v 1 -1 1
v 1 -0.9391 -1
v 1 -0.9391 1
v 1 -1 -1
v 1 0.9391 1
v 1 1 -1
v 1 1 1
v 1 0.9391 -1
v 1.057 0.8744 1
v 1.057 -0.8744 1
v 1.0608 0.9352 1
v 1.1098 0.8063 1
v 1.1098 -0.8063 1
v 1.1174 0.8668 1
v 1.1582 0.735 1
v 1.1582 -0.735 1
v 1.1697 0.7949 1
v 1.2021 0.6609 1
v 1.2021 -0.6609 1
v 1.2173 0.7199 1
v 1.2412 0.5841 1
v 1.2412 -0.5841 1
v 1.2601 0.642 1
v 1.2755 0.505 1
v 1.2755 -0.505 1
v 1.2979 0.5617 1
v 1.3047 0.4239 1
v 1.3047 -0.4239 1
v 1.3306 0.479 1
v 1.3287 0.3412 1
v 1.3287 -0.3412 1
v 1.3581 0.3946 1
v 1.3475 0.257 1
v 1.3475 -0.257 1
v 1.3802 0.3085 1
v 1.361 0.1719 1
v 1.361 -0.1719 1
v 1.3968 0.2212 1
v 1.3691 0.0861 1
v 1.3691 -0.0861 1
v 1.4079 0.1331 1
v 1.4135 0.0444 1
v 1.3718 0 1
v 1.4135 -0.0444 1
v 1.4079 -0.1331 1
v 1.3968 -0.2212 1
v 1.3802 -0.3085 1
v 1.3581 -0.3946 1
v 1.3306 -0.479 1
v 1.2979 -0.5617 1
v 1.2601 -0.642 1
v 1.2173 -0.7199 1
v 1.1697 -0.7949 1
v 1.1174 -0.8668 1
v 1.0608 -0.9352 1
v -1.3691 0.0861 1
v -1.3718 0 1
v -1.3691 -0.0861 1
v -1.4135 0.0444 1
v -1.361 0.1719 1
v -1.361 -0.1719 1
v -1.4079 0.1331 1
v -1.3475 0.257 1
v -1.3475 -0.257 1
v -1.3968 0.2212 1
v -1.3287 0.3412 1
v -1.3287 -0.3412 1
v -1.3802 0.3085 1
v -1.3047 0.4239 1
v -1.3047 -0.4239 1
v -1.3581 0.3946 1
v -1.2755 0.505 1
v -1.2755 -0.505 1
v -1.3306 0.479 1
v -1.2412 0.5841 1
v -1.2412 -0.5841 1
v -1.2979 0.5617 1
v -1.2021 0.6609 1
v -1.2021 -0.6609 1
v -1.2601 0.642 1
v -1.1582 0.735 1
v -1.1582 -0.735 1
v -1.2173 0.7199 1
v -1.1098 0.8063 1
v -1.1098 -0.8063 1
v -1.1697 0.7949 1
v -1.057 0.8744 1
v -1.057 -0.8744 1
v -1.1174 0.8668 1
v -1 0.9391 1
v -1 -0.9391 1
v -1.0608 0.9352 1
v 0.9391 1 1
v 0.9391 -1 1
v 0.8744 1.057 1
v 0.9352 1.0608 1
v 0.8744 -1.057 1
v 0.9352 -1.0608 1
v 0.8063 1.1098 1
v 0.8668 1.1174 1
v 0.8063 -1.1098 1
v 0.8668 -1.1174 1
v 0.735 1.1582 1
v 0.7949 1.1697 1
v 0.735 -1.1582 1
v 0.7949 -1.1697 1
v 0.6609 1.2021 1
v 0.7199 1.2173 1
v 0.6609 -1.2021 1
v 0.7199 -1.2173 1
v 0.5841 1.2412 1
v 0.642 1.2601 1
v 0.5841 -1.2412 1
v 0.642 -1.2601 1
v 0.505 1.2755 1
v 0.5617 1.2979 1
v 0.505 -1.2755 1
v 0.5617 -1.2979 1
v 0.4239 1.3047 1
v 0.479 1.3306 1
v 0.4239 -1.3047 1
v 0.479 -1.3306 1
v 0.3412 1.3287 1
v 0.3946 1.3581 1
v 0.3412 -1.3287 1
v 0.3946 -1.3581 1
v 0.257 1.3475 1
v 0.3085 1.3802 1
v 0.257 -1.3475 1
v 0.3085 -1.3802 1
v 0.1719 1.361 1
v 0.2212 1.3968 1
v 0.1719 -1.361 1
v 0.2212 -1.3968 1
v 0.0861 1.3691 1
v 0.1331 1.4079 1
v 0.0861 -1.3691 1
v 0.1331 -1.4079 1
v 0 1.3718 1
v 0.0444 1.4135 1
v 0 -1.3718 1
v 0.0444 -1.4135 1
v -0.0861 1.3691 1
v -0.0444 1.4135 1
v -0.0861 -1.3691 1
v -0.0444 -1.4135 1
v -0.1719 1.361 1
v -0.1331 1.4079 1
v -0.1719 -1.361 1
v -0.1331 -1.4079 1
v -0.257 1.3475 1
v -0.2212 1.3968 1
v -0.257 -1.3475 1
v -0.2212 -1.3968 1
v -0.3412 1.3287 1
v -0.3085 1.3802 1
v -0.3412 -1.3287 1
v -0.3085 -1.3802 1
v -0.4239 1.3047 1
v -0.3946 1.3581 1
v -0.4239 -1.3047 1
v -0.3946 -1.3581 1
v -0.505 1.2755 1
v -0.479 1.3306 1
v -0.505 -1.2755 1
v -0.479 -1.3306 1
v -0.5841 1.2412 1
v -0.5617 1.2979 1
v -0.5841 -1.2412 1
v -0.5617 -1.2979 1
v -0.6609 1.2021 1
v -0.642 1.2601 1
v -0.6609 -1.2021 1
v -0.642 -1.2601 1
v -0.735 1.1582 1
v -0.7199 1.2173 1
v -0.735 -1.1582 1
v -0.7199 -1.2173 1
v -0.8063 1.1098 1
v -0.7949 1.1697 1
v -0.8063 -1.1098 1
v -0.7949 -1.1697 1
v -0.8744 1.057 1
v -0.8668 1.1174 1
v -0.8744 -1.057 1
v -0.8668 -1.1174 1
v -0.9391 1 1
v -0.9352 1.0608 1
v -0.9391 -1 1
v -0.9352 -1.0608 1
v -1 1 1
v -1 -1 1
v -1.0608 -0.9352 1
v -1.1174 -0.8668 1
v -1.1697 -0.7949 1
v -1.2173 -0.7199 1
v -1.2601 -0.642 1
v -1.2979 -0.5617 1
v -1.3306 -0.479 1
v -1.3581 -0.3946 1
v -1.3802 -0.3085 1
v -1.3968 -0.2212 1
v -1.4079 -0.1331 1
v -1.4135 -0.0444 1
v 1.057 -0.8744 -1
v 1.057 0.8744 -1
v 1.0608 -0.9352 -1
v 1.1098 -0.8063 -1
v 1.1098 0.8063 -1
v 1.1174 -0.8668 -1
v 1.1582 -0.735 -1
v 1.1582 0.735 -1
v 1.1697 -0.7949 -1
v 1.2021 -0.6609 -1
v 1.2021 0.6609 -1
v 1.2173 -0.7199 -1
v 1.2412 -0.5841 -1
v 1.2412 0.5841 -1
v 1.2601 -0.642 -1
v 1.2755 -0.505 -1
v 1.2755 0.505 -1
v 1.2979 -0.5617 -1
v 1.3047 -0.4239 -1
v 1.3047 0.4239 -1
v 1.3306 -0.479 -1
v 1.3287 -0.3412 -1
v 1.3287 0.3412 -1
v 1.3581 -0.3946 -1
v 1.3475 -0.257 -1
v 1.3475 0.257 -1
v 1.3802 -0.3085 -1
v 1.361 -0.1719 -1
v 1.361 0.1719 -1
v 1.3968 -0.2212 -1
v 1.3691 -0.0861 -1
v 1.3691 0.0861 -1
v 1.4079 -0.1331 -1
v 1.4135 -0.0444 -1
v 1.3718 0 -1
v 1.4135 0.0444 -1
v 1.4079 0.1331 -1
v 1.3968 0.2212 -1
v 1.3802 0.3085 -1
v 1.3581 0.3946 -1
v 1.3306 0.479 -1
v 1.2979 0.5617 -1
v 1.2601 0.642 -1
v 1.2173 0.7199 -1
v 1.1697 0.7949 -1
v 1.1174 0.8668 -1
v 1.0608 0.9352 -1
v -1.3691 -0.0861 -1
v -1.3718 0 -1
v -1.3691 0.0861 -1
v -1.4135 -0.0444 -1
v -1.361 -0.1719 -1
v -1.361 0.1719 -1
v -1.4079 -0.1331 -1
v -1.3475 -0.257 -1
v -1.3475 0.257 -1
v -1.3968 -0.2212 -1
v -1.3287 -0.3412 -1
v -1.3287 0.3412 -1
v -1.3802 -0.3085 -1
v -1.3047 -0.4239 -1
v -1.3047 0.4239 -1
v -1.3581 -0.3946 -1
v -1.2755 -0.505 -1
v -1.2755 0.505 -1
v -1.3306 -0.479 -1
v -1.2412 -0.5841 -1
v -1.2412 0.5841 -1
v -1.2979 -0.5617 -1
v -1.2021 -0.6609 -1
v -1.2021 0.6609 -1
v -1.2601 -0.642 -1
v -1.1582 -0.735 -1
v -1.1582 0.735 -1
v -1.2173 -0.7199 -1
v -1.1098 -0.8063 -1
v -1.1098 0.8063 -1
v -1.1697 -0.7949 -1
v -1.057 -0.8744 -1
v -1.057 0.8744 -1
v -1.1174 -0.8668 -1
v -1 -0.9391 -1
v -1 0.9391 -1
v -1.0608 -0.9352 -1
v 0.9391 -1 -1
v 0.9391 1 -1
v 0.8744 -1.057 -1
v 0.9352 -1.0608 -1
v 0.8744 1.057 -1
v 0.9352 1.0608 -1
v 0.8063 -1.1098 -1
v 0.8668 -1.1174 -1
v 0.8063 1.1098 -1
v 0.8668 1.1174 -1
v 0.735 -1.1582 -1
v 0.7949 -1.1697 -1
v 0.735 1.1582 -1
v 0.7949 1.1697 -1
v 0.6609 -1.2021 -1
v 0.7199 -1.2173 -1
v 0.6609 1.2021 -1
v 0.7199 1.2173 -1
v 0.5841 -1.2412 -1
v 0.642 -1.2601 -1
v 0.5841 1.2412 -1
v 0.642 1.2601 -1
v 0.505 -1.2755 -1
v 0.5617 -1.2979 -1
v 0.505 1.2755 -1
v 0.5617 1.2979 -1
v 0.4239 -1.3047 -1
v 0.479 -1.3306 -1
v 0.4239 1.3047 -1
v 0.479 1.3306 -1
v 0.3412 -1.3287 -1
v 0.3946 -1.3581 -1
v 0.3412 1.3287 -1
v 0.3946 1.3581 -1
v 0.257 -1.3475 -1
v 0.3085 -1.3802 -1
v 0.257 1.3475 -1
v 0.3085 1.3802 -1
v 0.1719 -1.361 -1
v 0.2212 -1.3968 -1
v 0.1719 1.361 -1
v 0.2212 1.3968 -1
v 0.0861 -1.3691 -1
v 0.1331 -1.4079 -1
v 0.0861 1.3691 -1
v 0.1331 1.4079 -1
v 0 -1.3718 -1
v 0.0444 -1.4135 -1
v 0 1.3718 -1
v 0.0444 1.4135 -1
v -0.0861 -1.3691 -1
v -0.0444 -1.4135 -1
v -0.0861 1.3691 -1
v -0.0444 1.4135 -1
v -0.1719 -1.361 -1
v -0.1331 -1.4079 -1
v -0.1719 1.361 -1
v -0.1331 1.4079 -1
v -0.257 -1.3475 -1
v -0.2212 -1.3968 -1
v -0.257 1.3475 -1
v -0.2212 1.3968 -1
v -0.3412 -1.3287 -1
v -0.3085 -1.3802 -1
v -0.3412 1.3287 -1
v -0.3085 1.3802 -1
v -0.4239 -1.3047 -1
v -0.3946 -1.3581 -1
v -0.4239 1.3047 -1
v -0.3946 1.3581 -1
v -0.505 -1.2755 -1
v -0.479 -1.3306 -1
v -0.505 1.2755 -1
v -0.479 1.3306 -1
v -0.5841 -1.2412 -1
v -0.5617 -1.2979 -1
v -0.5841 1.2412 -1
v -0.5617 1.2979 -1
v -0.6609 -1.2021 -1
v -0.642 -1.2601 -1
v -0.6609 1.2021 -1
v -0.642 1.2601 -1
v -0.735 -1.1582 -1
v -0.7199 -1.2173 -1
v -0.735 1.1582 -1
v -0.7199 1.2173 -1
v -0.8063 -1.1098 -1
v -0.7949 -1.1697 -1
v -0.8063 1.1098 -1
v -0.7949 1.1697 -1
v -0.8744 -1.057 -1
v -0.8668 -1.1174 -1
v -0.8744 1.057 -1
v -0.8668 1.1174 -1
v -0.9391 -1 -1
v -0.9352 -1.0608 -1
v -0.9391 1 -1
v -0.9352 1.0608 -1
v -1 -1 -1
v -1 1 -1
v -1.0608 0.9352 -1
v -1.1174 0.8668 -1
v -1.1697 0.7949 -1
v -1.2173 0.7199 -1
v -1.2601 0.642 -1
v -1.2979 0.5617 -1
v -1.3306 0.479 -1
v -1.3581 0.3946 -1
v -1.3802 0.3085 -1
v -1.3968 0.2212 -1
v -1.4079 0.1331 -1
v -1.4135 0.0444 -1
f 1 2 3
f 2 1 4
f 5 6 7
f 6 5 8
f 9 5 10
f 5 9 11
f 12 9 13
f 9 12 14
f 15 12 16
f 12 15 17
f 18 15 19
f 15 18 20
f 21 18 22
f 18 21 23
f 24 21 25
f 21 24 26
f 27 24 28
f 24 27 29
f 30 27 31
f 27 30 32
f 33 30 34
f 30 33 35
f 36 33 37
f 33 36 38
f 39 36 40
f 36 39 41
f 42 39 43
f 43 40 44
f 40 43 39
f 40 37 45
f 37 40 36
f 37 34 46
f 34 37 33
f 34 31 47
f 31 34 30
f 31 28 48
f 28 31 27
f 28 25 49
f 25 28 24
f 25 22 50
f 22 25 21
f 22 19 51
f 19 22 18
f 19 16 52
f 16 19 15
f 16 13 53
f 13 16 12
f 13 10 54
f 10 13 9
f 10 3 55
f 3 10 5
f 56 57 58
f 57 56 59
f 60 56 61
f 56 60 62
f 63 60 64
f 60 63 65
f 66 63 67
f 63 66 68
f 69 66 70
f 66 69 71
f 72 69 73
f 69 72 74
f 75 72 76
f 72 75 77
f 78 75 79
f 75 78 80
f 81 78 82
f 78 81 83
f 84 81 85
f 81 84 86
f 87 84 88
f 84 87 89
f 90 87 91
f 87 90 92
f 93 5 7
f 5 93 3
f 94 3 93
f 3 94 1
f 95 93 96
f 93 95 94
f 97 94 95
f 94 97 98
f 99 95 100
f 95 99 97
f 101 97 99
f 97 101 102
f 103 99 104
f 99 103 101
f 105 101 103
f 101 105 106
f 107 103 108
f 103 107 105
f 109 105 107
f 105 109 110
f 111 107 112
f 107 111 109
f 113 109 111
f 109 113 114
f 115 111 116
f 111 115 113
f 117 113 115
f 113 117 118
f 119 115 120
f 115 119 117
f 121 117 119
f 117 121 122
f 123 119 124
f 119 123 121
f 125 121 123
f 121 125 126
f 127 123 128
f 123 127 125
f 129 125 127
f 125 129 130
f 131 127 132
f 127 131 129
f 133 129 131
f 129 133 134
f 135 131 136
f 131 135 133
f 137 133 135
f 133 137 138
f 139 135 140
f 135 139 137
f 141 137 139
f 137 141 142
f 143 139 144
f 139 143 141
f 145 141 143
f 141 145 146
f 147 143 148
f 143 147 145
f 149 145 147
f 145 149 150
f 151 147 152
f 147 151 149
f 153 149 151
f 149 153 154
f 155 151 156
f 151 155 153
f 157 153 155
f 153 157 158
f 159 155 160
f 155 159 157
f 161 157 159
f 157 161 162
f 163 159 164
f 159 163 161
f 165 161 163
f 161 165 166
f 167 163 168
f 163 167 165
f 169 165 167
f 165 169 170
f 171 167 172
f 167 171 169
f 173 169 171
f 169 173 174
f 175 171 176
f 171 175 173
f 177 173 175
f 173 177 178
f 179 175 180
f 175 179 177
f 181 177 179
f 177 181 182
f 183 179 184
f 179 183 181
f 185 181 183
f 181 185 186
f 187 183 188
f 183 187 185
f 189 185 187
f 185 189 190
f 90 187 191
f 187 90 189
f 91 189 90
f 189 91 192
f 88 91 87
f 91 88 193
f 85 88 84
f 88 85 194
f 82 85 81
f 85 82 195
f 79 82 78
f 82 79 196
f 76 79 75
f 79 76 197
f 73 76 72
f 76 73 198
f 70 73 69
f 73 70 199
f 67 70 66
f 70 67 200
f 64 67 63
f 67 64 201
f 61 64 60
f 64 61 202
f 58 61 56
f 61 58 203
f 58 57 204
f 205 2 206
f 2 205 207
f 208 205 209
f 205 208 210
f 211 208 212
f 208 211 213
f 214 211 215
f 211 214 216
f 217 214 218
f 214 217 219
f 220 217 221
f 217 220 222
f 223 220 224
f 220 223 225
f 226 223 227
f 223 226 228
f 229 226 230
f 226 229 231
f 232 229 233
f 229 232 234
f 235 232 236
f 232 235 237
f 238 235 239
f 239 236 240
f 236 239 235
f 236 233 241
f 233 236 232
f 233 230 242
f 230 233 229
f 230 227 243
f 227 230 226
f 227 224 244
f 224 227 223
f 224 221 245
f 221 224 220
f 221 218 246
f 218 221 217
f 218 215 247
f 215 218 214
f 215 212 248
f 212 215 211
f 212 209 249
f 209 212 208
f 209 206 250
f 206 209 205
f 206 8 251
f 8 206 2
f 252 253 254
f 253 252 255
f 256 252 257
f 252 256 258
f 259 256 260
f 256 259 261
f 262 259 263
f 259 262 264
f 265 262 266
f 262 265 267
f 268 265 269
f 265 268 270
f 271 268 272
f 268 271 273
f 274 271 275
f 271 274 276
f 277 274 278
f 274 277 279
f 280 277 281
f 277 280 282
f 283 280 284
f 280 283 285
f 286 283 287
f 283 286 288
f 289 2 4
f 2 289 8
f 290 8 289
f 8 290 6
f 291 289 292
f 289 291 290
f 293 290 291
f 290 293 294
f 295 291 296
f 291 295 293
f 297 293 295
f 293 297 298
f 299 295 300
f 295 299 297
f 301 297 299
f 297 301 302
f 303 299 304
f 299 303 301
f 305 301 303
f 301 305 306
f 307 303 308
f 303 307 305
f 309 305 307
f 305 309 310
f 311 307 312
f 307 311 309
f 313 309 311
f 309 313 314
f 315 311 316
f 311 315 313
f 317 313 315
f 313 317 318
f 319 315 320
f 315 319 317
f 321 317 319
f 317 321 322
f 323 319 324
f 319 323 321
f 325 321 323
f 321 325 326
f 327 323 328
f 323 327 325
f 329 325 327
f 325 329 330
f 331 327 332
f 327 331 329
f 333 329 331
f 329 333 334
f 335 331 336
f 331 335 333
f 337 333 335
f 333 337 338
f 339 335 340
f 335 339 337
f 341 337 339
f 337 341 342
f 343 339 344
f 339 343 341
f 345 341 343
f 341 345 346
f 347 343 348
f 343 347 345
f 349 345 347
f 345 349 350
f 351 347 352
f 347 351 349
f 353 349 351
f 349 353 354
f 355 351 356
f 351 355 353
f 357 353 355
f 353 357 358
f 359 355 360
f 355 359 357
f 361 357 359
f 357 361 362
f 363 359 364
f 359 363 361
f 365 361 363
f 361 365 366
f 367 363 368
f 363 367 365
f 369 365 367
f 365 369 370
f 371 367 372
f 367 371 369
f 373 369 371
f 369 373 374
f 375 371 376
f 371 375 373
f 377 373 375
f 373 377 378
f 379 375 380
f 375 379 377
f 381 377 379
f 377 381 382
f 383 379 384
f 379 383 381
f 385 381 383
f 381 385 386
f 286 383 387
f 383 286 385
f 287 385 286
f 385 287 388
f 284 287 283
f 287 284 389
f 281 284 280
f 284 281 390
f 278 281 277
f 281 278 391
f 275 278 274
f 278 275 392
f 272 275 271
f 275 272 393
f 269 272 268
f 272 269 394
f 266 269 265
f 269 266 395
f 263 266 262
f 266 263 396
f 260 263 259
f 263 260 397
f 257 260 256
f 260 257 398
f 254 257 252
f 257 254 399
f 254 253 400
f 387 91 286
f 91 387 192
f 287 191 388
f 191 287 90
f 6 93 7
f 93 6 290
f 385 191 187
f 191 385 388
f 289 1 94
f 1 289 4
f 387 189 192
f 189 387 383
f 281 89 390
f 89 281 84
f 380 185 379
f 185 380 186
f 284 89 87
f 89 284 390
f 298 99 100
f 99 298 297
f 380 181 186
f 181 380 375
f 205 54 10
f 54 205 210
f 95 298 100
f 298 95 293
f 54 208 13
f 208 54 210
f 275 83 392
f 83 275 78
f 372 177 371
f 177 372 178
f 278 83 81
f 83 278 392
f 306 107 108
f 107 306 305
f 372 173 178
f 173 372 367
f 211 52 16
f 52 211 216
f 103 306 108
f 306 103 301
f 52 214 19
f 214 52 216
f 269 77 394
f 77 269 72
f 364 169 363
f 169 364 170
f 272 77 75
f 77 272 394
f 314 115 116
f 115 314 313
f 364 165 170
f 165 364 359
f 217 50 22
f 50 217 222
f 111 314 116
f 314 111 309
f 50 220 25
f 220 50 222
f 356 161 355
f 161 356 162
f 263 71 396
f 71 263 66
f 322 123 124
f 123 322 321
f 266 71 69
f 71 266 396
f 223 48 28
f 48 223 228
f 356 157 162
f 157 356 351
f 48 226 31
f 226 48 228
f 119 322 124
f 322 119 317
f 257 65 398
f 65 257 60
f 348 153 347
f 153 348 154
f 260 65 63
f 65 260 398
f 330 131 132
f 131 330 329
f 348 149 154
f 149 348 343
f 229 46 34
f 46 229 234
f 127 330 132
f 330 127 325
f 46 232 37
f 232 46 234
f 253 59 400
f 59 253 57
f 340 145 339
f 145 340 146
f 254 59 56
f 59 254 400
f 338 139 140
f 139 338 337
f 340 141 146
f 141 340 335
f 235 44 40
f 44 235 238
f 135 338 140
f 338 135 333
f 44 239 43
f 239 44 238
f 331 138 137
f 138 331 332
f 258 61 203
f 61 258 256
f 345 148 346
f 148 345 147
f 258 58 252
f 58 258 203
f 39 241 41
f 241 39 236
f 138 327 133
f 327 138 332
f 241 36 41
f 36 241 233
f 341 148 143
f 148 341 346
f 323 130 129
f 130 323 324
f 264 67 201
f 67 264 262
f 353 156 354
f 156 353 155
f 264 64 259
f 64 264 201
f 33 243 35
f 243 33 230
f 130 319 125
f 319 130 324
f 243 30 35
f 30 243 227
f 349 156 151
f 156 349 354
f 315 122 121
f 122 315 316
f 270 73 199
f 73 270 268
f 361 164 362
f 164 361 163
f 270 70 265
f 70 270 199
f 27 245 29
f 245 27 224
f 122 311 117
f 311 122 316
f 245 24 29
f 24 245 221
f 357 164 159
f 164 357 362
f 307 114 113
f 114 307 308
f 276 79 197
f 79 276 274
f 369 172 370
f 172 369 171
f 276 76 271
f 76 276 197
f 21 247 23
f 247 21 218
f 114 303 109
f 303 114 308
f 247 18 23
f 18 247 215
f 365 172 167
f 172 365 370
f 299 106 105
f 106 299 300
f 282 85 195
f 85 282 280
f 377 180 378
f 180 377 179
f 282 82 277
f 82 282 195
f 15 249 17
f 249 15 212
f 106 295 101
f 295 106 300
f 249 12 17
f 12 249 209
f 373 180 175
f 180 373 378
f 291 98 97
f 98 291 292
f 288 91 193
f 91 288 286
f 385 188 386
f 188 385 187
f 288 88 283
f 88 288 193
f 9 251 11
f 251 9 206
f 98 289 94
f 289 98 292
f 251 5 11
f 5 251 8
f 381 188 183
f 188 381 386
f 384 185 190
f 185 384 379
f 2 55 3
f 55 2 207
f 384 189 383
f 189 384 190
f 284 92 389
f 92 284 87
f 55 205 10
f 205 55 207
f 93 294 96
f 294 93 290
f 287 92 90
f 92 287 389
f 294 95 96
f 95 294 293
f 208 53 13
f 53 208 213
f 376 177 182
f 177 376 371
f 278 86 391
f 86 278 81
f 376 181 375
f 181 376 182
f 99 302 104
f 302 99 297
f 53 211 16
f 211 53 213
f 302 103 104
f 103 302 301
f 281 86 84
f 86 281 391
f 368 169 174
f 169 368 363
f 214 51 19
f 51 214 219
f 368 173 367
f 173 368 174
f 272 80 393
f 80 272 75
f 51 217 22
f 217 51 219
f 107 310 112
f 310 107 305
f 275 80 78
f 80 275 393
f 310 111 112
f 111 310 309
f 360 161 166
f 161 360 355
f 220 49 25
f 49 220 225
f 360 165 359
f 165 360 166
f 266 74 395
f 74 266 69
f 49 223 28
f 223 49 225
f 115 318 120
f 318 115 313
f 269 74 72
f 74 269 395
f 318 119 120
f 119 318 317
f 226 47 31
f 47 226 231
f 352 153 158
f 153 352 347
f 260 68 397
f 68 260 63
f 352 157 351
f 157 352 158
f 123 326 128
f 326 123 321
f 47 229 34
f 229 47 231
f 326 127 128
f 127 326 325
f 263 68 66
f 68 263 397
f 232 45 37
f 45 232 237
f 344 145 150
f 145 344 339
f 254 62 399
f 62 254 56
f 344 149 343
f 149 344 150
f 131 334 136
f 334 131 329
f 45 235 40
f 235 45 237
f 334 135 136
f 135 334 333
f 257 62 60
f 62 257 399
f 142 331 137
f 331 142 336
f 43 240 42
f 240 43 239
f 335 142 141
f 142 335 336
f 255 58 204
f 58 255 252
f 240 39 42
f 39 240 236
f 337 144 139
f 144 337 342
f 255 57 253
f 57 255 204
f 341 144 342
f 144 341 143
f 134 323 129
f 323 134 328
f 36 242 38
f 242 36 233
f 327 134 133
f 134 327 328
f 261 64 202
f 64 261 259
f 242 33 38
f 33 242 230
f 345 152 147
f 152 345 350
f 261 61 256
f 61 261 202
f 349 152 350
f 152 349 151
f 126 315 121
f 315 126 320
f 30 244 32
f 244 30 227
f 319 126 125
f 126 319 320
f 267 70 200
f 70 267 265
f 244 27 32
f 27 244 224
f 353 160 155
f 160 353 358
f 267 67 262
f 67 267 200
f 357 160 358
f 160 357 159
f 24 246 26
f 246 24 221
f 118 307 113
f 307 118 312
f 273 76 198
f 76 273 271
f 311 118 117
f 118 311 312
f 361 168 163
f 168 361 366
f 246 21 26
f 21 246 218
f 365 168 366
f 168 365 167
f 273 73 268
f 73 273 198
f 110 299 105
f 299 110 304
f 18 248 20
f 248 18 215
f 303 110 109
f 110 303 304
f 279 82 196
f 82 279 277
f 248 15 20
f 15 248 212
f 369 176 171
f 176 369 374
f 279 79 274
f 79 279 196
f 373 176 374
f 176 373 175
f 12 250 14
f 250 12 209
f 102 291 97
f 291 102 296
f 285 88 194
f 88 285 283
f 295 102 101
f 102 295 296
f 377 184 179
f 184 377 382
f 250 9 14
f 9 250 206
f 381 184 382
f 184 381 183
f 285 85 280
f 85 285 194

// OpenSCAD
module multi_rot_cube(N=10) {
   alpha=360/N;
   union() {
      for(i=[0:N-1]) {
         rotate(i*alpha)
            cube(center=true);
      }
   }
}


union() {
   scale(2) multi_rot_cube(N=50);
   translate([0,0,0.5]) multi_rot_cube(N=50);
}
   
